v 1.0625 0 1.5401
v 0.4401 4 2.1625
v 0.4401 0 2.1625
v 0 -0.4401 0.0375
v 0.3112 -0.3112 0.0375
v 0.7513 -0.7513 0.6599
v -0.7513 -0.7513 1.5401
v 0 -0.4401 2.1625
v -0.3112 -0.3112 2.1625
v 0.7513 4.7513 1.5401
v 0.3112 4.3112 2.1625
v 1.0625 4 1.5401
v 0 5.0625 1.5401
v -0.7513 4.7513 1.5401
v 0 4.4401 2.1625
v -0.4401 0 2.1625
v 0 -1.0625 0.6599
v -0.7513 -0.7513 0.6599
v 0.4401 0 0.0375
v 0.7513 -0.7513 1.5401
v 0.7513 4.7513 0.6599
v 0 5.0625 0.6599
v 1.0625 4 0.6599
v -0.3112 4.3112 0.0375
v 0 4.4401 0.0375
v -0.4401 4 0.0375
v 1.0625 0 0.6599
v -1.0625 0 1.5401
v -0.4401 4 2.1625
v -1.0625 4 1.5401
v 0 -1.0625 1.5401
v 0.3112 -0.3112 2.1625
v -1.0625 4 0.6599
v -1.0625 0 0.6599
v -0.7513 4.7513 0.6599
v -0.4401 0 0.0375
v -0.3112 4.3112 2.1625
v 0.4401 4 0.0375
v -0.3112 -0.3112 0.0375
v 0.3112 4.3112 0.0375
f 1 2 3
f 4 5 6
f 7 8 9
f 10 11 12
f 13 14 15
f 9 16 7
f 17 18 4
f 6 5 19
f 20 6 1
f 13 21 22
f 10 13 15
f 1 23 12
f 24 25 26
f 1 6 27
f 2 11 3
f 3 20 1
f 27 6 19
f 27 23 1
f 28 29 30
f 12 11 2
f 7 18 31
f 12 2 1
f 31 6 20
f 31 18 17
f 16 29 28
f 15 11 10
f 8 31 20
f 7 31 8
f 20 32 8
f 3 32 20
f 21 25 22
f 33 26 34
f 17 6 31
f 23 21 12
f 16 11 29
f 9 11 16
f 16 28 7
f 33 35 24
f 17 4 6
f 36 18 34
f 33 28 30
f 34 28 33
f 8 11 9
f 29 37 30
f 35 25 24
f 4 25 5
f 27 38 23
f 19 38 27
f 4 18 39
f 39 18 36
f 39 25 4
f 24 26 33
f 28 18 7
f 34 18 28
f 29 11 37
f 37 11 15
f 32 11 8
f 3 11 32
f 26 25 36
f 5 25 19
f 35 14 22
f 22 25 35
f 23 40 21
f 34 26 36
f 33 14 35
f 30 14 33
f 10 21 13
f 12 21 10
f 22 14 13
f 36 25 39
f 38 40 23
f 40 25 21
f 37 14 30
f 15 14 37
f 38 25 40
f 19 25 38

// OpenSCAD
module rod(a, b, r) {
        hull() {
            translate(a) sphere(r,$fn=8);
            translate(b) sphere(r,$fn=8);
        }
    }
translate([0,0,1.1])
rod([0,0,0],[0,4,0],1.15);
